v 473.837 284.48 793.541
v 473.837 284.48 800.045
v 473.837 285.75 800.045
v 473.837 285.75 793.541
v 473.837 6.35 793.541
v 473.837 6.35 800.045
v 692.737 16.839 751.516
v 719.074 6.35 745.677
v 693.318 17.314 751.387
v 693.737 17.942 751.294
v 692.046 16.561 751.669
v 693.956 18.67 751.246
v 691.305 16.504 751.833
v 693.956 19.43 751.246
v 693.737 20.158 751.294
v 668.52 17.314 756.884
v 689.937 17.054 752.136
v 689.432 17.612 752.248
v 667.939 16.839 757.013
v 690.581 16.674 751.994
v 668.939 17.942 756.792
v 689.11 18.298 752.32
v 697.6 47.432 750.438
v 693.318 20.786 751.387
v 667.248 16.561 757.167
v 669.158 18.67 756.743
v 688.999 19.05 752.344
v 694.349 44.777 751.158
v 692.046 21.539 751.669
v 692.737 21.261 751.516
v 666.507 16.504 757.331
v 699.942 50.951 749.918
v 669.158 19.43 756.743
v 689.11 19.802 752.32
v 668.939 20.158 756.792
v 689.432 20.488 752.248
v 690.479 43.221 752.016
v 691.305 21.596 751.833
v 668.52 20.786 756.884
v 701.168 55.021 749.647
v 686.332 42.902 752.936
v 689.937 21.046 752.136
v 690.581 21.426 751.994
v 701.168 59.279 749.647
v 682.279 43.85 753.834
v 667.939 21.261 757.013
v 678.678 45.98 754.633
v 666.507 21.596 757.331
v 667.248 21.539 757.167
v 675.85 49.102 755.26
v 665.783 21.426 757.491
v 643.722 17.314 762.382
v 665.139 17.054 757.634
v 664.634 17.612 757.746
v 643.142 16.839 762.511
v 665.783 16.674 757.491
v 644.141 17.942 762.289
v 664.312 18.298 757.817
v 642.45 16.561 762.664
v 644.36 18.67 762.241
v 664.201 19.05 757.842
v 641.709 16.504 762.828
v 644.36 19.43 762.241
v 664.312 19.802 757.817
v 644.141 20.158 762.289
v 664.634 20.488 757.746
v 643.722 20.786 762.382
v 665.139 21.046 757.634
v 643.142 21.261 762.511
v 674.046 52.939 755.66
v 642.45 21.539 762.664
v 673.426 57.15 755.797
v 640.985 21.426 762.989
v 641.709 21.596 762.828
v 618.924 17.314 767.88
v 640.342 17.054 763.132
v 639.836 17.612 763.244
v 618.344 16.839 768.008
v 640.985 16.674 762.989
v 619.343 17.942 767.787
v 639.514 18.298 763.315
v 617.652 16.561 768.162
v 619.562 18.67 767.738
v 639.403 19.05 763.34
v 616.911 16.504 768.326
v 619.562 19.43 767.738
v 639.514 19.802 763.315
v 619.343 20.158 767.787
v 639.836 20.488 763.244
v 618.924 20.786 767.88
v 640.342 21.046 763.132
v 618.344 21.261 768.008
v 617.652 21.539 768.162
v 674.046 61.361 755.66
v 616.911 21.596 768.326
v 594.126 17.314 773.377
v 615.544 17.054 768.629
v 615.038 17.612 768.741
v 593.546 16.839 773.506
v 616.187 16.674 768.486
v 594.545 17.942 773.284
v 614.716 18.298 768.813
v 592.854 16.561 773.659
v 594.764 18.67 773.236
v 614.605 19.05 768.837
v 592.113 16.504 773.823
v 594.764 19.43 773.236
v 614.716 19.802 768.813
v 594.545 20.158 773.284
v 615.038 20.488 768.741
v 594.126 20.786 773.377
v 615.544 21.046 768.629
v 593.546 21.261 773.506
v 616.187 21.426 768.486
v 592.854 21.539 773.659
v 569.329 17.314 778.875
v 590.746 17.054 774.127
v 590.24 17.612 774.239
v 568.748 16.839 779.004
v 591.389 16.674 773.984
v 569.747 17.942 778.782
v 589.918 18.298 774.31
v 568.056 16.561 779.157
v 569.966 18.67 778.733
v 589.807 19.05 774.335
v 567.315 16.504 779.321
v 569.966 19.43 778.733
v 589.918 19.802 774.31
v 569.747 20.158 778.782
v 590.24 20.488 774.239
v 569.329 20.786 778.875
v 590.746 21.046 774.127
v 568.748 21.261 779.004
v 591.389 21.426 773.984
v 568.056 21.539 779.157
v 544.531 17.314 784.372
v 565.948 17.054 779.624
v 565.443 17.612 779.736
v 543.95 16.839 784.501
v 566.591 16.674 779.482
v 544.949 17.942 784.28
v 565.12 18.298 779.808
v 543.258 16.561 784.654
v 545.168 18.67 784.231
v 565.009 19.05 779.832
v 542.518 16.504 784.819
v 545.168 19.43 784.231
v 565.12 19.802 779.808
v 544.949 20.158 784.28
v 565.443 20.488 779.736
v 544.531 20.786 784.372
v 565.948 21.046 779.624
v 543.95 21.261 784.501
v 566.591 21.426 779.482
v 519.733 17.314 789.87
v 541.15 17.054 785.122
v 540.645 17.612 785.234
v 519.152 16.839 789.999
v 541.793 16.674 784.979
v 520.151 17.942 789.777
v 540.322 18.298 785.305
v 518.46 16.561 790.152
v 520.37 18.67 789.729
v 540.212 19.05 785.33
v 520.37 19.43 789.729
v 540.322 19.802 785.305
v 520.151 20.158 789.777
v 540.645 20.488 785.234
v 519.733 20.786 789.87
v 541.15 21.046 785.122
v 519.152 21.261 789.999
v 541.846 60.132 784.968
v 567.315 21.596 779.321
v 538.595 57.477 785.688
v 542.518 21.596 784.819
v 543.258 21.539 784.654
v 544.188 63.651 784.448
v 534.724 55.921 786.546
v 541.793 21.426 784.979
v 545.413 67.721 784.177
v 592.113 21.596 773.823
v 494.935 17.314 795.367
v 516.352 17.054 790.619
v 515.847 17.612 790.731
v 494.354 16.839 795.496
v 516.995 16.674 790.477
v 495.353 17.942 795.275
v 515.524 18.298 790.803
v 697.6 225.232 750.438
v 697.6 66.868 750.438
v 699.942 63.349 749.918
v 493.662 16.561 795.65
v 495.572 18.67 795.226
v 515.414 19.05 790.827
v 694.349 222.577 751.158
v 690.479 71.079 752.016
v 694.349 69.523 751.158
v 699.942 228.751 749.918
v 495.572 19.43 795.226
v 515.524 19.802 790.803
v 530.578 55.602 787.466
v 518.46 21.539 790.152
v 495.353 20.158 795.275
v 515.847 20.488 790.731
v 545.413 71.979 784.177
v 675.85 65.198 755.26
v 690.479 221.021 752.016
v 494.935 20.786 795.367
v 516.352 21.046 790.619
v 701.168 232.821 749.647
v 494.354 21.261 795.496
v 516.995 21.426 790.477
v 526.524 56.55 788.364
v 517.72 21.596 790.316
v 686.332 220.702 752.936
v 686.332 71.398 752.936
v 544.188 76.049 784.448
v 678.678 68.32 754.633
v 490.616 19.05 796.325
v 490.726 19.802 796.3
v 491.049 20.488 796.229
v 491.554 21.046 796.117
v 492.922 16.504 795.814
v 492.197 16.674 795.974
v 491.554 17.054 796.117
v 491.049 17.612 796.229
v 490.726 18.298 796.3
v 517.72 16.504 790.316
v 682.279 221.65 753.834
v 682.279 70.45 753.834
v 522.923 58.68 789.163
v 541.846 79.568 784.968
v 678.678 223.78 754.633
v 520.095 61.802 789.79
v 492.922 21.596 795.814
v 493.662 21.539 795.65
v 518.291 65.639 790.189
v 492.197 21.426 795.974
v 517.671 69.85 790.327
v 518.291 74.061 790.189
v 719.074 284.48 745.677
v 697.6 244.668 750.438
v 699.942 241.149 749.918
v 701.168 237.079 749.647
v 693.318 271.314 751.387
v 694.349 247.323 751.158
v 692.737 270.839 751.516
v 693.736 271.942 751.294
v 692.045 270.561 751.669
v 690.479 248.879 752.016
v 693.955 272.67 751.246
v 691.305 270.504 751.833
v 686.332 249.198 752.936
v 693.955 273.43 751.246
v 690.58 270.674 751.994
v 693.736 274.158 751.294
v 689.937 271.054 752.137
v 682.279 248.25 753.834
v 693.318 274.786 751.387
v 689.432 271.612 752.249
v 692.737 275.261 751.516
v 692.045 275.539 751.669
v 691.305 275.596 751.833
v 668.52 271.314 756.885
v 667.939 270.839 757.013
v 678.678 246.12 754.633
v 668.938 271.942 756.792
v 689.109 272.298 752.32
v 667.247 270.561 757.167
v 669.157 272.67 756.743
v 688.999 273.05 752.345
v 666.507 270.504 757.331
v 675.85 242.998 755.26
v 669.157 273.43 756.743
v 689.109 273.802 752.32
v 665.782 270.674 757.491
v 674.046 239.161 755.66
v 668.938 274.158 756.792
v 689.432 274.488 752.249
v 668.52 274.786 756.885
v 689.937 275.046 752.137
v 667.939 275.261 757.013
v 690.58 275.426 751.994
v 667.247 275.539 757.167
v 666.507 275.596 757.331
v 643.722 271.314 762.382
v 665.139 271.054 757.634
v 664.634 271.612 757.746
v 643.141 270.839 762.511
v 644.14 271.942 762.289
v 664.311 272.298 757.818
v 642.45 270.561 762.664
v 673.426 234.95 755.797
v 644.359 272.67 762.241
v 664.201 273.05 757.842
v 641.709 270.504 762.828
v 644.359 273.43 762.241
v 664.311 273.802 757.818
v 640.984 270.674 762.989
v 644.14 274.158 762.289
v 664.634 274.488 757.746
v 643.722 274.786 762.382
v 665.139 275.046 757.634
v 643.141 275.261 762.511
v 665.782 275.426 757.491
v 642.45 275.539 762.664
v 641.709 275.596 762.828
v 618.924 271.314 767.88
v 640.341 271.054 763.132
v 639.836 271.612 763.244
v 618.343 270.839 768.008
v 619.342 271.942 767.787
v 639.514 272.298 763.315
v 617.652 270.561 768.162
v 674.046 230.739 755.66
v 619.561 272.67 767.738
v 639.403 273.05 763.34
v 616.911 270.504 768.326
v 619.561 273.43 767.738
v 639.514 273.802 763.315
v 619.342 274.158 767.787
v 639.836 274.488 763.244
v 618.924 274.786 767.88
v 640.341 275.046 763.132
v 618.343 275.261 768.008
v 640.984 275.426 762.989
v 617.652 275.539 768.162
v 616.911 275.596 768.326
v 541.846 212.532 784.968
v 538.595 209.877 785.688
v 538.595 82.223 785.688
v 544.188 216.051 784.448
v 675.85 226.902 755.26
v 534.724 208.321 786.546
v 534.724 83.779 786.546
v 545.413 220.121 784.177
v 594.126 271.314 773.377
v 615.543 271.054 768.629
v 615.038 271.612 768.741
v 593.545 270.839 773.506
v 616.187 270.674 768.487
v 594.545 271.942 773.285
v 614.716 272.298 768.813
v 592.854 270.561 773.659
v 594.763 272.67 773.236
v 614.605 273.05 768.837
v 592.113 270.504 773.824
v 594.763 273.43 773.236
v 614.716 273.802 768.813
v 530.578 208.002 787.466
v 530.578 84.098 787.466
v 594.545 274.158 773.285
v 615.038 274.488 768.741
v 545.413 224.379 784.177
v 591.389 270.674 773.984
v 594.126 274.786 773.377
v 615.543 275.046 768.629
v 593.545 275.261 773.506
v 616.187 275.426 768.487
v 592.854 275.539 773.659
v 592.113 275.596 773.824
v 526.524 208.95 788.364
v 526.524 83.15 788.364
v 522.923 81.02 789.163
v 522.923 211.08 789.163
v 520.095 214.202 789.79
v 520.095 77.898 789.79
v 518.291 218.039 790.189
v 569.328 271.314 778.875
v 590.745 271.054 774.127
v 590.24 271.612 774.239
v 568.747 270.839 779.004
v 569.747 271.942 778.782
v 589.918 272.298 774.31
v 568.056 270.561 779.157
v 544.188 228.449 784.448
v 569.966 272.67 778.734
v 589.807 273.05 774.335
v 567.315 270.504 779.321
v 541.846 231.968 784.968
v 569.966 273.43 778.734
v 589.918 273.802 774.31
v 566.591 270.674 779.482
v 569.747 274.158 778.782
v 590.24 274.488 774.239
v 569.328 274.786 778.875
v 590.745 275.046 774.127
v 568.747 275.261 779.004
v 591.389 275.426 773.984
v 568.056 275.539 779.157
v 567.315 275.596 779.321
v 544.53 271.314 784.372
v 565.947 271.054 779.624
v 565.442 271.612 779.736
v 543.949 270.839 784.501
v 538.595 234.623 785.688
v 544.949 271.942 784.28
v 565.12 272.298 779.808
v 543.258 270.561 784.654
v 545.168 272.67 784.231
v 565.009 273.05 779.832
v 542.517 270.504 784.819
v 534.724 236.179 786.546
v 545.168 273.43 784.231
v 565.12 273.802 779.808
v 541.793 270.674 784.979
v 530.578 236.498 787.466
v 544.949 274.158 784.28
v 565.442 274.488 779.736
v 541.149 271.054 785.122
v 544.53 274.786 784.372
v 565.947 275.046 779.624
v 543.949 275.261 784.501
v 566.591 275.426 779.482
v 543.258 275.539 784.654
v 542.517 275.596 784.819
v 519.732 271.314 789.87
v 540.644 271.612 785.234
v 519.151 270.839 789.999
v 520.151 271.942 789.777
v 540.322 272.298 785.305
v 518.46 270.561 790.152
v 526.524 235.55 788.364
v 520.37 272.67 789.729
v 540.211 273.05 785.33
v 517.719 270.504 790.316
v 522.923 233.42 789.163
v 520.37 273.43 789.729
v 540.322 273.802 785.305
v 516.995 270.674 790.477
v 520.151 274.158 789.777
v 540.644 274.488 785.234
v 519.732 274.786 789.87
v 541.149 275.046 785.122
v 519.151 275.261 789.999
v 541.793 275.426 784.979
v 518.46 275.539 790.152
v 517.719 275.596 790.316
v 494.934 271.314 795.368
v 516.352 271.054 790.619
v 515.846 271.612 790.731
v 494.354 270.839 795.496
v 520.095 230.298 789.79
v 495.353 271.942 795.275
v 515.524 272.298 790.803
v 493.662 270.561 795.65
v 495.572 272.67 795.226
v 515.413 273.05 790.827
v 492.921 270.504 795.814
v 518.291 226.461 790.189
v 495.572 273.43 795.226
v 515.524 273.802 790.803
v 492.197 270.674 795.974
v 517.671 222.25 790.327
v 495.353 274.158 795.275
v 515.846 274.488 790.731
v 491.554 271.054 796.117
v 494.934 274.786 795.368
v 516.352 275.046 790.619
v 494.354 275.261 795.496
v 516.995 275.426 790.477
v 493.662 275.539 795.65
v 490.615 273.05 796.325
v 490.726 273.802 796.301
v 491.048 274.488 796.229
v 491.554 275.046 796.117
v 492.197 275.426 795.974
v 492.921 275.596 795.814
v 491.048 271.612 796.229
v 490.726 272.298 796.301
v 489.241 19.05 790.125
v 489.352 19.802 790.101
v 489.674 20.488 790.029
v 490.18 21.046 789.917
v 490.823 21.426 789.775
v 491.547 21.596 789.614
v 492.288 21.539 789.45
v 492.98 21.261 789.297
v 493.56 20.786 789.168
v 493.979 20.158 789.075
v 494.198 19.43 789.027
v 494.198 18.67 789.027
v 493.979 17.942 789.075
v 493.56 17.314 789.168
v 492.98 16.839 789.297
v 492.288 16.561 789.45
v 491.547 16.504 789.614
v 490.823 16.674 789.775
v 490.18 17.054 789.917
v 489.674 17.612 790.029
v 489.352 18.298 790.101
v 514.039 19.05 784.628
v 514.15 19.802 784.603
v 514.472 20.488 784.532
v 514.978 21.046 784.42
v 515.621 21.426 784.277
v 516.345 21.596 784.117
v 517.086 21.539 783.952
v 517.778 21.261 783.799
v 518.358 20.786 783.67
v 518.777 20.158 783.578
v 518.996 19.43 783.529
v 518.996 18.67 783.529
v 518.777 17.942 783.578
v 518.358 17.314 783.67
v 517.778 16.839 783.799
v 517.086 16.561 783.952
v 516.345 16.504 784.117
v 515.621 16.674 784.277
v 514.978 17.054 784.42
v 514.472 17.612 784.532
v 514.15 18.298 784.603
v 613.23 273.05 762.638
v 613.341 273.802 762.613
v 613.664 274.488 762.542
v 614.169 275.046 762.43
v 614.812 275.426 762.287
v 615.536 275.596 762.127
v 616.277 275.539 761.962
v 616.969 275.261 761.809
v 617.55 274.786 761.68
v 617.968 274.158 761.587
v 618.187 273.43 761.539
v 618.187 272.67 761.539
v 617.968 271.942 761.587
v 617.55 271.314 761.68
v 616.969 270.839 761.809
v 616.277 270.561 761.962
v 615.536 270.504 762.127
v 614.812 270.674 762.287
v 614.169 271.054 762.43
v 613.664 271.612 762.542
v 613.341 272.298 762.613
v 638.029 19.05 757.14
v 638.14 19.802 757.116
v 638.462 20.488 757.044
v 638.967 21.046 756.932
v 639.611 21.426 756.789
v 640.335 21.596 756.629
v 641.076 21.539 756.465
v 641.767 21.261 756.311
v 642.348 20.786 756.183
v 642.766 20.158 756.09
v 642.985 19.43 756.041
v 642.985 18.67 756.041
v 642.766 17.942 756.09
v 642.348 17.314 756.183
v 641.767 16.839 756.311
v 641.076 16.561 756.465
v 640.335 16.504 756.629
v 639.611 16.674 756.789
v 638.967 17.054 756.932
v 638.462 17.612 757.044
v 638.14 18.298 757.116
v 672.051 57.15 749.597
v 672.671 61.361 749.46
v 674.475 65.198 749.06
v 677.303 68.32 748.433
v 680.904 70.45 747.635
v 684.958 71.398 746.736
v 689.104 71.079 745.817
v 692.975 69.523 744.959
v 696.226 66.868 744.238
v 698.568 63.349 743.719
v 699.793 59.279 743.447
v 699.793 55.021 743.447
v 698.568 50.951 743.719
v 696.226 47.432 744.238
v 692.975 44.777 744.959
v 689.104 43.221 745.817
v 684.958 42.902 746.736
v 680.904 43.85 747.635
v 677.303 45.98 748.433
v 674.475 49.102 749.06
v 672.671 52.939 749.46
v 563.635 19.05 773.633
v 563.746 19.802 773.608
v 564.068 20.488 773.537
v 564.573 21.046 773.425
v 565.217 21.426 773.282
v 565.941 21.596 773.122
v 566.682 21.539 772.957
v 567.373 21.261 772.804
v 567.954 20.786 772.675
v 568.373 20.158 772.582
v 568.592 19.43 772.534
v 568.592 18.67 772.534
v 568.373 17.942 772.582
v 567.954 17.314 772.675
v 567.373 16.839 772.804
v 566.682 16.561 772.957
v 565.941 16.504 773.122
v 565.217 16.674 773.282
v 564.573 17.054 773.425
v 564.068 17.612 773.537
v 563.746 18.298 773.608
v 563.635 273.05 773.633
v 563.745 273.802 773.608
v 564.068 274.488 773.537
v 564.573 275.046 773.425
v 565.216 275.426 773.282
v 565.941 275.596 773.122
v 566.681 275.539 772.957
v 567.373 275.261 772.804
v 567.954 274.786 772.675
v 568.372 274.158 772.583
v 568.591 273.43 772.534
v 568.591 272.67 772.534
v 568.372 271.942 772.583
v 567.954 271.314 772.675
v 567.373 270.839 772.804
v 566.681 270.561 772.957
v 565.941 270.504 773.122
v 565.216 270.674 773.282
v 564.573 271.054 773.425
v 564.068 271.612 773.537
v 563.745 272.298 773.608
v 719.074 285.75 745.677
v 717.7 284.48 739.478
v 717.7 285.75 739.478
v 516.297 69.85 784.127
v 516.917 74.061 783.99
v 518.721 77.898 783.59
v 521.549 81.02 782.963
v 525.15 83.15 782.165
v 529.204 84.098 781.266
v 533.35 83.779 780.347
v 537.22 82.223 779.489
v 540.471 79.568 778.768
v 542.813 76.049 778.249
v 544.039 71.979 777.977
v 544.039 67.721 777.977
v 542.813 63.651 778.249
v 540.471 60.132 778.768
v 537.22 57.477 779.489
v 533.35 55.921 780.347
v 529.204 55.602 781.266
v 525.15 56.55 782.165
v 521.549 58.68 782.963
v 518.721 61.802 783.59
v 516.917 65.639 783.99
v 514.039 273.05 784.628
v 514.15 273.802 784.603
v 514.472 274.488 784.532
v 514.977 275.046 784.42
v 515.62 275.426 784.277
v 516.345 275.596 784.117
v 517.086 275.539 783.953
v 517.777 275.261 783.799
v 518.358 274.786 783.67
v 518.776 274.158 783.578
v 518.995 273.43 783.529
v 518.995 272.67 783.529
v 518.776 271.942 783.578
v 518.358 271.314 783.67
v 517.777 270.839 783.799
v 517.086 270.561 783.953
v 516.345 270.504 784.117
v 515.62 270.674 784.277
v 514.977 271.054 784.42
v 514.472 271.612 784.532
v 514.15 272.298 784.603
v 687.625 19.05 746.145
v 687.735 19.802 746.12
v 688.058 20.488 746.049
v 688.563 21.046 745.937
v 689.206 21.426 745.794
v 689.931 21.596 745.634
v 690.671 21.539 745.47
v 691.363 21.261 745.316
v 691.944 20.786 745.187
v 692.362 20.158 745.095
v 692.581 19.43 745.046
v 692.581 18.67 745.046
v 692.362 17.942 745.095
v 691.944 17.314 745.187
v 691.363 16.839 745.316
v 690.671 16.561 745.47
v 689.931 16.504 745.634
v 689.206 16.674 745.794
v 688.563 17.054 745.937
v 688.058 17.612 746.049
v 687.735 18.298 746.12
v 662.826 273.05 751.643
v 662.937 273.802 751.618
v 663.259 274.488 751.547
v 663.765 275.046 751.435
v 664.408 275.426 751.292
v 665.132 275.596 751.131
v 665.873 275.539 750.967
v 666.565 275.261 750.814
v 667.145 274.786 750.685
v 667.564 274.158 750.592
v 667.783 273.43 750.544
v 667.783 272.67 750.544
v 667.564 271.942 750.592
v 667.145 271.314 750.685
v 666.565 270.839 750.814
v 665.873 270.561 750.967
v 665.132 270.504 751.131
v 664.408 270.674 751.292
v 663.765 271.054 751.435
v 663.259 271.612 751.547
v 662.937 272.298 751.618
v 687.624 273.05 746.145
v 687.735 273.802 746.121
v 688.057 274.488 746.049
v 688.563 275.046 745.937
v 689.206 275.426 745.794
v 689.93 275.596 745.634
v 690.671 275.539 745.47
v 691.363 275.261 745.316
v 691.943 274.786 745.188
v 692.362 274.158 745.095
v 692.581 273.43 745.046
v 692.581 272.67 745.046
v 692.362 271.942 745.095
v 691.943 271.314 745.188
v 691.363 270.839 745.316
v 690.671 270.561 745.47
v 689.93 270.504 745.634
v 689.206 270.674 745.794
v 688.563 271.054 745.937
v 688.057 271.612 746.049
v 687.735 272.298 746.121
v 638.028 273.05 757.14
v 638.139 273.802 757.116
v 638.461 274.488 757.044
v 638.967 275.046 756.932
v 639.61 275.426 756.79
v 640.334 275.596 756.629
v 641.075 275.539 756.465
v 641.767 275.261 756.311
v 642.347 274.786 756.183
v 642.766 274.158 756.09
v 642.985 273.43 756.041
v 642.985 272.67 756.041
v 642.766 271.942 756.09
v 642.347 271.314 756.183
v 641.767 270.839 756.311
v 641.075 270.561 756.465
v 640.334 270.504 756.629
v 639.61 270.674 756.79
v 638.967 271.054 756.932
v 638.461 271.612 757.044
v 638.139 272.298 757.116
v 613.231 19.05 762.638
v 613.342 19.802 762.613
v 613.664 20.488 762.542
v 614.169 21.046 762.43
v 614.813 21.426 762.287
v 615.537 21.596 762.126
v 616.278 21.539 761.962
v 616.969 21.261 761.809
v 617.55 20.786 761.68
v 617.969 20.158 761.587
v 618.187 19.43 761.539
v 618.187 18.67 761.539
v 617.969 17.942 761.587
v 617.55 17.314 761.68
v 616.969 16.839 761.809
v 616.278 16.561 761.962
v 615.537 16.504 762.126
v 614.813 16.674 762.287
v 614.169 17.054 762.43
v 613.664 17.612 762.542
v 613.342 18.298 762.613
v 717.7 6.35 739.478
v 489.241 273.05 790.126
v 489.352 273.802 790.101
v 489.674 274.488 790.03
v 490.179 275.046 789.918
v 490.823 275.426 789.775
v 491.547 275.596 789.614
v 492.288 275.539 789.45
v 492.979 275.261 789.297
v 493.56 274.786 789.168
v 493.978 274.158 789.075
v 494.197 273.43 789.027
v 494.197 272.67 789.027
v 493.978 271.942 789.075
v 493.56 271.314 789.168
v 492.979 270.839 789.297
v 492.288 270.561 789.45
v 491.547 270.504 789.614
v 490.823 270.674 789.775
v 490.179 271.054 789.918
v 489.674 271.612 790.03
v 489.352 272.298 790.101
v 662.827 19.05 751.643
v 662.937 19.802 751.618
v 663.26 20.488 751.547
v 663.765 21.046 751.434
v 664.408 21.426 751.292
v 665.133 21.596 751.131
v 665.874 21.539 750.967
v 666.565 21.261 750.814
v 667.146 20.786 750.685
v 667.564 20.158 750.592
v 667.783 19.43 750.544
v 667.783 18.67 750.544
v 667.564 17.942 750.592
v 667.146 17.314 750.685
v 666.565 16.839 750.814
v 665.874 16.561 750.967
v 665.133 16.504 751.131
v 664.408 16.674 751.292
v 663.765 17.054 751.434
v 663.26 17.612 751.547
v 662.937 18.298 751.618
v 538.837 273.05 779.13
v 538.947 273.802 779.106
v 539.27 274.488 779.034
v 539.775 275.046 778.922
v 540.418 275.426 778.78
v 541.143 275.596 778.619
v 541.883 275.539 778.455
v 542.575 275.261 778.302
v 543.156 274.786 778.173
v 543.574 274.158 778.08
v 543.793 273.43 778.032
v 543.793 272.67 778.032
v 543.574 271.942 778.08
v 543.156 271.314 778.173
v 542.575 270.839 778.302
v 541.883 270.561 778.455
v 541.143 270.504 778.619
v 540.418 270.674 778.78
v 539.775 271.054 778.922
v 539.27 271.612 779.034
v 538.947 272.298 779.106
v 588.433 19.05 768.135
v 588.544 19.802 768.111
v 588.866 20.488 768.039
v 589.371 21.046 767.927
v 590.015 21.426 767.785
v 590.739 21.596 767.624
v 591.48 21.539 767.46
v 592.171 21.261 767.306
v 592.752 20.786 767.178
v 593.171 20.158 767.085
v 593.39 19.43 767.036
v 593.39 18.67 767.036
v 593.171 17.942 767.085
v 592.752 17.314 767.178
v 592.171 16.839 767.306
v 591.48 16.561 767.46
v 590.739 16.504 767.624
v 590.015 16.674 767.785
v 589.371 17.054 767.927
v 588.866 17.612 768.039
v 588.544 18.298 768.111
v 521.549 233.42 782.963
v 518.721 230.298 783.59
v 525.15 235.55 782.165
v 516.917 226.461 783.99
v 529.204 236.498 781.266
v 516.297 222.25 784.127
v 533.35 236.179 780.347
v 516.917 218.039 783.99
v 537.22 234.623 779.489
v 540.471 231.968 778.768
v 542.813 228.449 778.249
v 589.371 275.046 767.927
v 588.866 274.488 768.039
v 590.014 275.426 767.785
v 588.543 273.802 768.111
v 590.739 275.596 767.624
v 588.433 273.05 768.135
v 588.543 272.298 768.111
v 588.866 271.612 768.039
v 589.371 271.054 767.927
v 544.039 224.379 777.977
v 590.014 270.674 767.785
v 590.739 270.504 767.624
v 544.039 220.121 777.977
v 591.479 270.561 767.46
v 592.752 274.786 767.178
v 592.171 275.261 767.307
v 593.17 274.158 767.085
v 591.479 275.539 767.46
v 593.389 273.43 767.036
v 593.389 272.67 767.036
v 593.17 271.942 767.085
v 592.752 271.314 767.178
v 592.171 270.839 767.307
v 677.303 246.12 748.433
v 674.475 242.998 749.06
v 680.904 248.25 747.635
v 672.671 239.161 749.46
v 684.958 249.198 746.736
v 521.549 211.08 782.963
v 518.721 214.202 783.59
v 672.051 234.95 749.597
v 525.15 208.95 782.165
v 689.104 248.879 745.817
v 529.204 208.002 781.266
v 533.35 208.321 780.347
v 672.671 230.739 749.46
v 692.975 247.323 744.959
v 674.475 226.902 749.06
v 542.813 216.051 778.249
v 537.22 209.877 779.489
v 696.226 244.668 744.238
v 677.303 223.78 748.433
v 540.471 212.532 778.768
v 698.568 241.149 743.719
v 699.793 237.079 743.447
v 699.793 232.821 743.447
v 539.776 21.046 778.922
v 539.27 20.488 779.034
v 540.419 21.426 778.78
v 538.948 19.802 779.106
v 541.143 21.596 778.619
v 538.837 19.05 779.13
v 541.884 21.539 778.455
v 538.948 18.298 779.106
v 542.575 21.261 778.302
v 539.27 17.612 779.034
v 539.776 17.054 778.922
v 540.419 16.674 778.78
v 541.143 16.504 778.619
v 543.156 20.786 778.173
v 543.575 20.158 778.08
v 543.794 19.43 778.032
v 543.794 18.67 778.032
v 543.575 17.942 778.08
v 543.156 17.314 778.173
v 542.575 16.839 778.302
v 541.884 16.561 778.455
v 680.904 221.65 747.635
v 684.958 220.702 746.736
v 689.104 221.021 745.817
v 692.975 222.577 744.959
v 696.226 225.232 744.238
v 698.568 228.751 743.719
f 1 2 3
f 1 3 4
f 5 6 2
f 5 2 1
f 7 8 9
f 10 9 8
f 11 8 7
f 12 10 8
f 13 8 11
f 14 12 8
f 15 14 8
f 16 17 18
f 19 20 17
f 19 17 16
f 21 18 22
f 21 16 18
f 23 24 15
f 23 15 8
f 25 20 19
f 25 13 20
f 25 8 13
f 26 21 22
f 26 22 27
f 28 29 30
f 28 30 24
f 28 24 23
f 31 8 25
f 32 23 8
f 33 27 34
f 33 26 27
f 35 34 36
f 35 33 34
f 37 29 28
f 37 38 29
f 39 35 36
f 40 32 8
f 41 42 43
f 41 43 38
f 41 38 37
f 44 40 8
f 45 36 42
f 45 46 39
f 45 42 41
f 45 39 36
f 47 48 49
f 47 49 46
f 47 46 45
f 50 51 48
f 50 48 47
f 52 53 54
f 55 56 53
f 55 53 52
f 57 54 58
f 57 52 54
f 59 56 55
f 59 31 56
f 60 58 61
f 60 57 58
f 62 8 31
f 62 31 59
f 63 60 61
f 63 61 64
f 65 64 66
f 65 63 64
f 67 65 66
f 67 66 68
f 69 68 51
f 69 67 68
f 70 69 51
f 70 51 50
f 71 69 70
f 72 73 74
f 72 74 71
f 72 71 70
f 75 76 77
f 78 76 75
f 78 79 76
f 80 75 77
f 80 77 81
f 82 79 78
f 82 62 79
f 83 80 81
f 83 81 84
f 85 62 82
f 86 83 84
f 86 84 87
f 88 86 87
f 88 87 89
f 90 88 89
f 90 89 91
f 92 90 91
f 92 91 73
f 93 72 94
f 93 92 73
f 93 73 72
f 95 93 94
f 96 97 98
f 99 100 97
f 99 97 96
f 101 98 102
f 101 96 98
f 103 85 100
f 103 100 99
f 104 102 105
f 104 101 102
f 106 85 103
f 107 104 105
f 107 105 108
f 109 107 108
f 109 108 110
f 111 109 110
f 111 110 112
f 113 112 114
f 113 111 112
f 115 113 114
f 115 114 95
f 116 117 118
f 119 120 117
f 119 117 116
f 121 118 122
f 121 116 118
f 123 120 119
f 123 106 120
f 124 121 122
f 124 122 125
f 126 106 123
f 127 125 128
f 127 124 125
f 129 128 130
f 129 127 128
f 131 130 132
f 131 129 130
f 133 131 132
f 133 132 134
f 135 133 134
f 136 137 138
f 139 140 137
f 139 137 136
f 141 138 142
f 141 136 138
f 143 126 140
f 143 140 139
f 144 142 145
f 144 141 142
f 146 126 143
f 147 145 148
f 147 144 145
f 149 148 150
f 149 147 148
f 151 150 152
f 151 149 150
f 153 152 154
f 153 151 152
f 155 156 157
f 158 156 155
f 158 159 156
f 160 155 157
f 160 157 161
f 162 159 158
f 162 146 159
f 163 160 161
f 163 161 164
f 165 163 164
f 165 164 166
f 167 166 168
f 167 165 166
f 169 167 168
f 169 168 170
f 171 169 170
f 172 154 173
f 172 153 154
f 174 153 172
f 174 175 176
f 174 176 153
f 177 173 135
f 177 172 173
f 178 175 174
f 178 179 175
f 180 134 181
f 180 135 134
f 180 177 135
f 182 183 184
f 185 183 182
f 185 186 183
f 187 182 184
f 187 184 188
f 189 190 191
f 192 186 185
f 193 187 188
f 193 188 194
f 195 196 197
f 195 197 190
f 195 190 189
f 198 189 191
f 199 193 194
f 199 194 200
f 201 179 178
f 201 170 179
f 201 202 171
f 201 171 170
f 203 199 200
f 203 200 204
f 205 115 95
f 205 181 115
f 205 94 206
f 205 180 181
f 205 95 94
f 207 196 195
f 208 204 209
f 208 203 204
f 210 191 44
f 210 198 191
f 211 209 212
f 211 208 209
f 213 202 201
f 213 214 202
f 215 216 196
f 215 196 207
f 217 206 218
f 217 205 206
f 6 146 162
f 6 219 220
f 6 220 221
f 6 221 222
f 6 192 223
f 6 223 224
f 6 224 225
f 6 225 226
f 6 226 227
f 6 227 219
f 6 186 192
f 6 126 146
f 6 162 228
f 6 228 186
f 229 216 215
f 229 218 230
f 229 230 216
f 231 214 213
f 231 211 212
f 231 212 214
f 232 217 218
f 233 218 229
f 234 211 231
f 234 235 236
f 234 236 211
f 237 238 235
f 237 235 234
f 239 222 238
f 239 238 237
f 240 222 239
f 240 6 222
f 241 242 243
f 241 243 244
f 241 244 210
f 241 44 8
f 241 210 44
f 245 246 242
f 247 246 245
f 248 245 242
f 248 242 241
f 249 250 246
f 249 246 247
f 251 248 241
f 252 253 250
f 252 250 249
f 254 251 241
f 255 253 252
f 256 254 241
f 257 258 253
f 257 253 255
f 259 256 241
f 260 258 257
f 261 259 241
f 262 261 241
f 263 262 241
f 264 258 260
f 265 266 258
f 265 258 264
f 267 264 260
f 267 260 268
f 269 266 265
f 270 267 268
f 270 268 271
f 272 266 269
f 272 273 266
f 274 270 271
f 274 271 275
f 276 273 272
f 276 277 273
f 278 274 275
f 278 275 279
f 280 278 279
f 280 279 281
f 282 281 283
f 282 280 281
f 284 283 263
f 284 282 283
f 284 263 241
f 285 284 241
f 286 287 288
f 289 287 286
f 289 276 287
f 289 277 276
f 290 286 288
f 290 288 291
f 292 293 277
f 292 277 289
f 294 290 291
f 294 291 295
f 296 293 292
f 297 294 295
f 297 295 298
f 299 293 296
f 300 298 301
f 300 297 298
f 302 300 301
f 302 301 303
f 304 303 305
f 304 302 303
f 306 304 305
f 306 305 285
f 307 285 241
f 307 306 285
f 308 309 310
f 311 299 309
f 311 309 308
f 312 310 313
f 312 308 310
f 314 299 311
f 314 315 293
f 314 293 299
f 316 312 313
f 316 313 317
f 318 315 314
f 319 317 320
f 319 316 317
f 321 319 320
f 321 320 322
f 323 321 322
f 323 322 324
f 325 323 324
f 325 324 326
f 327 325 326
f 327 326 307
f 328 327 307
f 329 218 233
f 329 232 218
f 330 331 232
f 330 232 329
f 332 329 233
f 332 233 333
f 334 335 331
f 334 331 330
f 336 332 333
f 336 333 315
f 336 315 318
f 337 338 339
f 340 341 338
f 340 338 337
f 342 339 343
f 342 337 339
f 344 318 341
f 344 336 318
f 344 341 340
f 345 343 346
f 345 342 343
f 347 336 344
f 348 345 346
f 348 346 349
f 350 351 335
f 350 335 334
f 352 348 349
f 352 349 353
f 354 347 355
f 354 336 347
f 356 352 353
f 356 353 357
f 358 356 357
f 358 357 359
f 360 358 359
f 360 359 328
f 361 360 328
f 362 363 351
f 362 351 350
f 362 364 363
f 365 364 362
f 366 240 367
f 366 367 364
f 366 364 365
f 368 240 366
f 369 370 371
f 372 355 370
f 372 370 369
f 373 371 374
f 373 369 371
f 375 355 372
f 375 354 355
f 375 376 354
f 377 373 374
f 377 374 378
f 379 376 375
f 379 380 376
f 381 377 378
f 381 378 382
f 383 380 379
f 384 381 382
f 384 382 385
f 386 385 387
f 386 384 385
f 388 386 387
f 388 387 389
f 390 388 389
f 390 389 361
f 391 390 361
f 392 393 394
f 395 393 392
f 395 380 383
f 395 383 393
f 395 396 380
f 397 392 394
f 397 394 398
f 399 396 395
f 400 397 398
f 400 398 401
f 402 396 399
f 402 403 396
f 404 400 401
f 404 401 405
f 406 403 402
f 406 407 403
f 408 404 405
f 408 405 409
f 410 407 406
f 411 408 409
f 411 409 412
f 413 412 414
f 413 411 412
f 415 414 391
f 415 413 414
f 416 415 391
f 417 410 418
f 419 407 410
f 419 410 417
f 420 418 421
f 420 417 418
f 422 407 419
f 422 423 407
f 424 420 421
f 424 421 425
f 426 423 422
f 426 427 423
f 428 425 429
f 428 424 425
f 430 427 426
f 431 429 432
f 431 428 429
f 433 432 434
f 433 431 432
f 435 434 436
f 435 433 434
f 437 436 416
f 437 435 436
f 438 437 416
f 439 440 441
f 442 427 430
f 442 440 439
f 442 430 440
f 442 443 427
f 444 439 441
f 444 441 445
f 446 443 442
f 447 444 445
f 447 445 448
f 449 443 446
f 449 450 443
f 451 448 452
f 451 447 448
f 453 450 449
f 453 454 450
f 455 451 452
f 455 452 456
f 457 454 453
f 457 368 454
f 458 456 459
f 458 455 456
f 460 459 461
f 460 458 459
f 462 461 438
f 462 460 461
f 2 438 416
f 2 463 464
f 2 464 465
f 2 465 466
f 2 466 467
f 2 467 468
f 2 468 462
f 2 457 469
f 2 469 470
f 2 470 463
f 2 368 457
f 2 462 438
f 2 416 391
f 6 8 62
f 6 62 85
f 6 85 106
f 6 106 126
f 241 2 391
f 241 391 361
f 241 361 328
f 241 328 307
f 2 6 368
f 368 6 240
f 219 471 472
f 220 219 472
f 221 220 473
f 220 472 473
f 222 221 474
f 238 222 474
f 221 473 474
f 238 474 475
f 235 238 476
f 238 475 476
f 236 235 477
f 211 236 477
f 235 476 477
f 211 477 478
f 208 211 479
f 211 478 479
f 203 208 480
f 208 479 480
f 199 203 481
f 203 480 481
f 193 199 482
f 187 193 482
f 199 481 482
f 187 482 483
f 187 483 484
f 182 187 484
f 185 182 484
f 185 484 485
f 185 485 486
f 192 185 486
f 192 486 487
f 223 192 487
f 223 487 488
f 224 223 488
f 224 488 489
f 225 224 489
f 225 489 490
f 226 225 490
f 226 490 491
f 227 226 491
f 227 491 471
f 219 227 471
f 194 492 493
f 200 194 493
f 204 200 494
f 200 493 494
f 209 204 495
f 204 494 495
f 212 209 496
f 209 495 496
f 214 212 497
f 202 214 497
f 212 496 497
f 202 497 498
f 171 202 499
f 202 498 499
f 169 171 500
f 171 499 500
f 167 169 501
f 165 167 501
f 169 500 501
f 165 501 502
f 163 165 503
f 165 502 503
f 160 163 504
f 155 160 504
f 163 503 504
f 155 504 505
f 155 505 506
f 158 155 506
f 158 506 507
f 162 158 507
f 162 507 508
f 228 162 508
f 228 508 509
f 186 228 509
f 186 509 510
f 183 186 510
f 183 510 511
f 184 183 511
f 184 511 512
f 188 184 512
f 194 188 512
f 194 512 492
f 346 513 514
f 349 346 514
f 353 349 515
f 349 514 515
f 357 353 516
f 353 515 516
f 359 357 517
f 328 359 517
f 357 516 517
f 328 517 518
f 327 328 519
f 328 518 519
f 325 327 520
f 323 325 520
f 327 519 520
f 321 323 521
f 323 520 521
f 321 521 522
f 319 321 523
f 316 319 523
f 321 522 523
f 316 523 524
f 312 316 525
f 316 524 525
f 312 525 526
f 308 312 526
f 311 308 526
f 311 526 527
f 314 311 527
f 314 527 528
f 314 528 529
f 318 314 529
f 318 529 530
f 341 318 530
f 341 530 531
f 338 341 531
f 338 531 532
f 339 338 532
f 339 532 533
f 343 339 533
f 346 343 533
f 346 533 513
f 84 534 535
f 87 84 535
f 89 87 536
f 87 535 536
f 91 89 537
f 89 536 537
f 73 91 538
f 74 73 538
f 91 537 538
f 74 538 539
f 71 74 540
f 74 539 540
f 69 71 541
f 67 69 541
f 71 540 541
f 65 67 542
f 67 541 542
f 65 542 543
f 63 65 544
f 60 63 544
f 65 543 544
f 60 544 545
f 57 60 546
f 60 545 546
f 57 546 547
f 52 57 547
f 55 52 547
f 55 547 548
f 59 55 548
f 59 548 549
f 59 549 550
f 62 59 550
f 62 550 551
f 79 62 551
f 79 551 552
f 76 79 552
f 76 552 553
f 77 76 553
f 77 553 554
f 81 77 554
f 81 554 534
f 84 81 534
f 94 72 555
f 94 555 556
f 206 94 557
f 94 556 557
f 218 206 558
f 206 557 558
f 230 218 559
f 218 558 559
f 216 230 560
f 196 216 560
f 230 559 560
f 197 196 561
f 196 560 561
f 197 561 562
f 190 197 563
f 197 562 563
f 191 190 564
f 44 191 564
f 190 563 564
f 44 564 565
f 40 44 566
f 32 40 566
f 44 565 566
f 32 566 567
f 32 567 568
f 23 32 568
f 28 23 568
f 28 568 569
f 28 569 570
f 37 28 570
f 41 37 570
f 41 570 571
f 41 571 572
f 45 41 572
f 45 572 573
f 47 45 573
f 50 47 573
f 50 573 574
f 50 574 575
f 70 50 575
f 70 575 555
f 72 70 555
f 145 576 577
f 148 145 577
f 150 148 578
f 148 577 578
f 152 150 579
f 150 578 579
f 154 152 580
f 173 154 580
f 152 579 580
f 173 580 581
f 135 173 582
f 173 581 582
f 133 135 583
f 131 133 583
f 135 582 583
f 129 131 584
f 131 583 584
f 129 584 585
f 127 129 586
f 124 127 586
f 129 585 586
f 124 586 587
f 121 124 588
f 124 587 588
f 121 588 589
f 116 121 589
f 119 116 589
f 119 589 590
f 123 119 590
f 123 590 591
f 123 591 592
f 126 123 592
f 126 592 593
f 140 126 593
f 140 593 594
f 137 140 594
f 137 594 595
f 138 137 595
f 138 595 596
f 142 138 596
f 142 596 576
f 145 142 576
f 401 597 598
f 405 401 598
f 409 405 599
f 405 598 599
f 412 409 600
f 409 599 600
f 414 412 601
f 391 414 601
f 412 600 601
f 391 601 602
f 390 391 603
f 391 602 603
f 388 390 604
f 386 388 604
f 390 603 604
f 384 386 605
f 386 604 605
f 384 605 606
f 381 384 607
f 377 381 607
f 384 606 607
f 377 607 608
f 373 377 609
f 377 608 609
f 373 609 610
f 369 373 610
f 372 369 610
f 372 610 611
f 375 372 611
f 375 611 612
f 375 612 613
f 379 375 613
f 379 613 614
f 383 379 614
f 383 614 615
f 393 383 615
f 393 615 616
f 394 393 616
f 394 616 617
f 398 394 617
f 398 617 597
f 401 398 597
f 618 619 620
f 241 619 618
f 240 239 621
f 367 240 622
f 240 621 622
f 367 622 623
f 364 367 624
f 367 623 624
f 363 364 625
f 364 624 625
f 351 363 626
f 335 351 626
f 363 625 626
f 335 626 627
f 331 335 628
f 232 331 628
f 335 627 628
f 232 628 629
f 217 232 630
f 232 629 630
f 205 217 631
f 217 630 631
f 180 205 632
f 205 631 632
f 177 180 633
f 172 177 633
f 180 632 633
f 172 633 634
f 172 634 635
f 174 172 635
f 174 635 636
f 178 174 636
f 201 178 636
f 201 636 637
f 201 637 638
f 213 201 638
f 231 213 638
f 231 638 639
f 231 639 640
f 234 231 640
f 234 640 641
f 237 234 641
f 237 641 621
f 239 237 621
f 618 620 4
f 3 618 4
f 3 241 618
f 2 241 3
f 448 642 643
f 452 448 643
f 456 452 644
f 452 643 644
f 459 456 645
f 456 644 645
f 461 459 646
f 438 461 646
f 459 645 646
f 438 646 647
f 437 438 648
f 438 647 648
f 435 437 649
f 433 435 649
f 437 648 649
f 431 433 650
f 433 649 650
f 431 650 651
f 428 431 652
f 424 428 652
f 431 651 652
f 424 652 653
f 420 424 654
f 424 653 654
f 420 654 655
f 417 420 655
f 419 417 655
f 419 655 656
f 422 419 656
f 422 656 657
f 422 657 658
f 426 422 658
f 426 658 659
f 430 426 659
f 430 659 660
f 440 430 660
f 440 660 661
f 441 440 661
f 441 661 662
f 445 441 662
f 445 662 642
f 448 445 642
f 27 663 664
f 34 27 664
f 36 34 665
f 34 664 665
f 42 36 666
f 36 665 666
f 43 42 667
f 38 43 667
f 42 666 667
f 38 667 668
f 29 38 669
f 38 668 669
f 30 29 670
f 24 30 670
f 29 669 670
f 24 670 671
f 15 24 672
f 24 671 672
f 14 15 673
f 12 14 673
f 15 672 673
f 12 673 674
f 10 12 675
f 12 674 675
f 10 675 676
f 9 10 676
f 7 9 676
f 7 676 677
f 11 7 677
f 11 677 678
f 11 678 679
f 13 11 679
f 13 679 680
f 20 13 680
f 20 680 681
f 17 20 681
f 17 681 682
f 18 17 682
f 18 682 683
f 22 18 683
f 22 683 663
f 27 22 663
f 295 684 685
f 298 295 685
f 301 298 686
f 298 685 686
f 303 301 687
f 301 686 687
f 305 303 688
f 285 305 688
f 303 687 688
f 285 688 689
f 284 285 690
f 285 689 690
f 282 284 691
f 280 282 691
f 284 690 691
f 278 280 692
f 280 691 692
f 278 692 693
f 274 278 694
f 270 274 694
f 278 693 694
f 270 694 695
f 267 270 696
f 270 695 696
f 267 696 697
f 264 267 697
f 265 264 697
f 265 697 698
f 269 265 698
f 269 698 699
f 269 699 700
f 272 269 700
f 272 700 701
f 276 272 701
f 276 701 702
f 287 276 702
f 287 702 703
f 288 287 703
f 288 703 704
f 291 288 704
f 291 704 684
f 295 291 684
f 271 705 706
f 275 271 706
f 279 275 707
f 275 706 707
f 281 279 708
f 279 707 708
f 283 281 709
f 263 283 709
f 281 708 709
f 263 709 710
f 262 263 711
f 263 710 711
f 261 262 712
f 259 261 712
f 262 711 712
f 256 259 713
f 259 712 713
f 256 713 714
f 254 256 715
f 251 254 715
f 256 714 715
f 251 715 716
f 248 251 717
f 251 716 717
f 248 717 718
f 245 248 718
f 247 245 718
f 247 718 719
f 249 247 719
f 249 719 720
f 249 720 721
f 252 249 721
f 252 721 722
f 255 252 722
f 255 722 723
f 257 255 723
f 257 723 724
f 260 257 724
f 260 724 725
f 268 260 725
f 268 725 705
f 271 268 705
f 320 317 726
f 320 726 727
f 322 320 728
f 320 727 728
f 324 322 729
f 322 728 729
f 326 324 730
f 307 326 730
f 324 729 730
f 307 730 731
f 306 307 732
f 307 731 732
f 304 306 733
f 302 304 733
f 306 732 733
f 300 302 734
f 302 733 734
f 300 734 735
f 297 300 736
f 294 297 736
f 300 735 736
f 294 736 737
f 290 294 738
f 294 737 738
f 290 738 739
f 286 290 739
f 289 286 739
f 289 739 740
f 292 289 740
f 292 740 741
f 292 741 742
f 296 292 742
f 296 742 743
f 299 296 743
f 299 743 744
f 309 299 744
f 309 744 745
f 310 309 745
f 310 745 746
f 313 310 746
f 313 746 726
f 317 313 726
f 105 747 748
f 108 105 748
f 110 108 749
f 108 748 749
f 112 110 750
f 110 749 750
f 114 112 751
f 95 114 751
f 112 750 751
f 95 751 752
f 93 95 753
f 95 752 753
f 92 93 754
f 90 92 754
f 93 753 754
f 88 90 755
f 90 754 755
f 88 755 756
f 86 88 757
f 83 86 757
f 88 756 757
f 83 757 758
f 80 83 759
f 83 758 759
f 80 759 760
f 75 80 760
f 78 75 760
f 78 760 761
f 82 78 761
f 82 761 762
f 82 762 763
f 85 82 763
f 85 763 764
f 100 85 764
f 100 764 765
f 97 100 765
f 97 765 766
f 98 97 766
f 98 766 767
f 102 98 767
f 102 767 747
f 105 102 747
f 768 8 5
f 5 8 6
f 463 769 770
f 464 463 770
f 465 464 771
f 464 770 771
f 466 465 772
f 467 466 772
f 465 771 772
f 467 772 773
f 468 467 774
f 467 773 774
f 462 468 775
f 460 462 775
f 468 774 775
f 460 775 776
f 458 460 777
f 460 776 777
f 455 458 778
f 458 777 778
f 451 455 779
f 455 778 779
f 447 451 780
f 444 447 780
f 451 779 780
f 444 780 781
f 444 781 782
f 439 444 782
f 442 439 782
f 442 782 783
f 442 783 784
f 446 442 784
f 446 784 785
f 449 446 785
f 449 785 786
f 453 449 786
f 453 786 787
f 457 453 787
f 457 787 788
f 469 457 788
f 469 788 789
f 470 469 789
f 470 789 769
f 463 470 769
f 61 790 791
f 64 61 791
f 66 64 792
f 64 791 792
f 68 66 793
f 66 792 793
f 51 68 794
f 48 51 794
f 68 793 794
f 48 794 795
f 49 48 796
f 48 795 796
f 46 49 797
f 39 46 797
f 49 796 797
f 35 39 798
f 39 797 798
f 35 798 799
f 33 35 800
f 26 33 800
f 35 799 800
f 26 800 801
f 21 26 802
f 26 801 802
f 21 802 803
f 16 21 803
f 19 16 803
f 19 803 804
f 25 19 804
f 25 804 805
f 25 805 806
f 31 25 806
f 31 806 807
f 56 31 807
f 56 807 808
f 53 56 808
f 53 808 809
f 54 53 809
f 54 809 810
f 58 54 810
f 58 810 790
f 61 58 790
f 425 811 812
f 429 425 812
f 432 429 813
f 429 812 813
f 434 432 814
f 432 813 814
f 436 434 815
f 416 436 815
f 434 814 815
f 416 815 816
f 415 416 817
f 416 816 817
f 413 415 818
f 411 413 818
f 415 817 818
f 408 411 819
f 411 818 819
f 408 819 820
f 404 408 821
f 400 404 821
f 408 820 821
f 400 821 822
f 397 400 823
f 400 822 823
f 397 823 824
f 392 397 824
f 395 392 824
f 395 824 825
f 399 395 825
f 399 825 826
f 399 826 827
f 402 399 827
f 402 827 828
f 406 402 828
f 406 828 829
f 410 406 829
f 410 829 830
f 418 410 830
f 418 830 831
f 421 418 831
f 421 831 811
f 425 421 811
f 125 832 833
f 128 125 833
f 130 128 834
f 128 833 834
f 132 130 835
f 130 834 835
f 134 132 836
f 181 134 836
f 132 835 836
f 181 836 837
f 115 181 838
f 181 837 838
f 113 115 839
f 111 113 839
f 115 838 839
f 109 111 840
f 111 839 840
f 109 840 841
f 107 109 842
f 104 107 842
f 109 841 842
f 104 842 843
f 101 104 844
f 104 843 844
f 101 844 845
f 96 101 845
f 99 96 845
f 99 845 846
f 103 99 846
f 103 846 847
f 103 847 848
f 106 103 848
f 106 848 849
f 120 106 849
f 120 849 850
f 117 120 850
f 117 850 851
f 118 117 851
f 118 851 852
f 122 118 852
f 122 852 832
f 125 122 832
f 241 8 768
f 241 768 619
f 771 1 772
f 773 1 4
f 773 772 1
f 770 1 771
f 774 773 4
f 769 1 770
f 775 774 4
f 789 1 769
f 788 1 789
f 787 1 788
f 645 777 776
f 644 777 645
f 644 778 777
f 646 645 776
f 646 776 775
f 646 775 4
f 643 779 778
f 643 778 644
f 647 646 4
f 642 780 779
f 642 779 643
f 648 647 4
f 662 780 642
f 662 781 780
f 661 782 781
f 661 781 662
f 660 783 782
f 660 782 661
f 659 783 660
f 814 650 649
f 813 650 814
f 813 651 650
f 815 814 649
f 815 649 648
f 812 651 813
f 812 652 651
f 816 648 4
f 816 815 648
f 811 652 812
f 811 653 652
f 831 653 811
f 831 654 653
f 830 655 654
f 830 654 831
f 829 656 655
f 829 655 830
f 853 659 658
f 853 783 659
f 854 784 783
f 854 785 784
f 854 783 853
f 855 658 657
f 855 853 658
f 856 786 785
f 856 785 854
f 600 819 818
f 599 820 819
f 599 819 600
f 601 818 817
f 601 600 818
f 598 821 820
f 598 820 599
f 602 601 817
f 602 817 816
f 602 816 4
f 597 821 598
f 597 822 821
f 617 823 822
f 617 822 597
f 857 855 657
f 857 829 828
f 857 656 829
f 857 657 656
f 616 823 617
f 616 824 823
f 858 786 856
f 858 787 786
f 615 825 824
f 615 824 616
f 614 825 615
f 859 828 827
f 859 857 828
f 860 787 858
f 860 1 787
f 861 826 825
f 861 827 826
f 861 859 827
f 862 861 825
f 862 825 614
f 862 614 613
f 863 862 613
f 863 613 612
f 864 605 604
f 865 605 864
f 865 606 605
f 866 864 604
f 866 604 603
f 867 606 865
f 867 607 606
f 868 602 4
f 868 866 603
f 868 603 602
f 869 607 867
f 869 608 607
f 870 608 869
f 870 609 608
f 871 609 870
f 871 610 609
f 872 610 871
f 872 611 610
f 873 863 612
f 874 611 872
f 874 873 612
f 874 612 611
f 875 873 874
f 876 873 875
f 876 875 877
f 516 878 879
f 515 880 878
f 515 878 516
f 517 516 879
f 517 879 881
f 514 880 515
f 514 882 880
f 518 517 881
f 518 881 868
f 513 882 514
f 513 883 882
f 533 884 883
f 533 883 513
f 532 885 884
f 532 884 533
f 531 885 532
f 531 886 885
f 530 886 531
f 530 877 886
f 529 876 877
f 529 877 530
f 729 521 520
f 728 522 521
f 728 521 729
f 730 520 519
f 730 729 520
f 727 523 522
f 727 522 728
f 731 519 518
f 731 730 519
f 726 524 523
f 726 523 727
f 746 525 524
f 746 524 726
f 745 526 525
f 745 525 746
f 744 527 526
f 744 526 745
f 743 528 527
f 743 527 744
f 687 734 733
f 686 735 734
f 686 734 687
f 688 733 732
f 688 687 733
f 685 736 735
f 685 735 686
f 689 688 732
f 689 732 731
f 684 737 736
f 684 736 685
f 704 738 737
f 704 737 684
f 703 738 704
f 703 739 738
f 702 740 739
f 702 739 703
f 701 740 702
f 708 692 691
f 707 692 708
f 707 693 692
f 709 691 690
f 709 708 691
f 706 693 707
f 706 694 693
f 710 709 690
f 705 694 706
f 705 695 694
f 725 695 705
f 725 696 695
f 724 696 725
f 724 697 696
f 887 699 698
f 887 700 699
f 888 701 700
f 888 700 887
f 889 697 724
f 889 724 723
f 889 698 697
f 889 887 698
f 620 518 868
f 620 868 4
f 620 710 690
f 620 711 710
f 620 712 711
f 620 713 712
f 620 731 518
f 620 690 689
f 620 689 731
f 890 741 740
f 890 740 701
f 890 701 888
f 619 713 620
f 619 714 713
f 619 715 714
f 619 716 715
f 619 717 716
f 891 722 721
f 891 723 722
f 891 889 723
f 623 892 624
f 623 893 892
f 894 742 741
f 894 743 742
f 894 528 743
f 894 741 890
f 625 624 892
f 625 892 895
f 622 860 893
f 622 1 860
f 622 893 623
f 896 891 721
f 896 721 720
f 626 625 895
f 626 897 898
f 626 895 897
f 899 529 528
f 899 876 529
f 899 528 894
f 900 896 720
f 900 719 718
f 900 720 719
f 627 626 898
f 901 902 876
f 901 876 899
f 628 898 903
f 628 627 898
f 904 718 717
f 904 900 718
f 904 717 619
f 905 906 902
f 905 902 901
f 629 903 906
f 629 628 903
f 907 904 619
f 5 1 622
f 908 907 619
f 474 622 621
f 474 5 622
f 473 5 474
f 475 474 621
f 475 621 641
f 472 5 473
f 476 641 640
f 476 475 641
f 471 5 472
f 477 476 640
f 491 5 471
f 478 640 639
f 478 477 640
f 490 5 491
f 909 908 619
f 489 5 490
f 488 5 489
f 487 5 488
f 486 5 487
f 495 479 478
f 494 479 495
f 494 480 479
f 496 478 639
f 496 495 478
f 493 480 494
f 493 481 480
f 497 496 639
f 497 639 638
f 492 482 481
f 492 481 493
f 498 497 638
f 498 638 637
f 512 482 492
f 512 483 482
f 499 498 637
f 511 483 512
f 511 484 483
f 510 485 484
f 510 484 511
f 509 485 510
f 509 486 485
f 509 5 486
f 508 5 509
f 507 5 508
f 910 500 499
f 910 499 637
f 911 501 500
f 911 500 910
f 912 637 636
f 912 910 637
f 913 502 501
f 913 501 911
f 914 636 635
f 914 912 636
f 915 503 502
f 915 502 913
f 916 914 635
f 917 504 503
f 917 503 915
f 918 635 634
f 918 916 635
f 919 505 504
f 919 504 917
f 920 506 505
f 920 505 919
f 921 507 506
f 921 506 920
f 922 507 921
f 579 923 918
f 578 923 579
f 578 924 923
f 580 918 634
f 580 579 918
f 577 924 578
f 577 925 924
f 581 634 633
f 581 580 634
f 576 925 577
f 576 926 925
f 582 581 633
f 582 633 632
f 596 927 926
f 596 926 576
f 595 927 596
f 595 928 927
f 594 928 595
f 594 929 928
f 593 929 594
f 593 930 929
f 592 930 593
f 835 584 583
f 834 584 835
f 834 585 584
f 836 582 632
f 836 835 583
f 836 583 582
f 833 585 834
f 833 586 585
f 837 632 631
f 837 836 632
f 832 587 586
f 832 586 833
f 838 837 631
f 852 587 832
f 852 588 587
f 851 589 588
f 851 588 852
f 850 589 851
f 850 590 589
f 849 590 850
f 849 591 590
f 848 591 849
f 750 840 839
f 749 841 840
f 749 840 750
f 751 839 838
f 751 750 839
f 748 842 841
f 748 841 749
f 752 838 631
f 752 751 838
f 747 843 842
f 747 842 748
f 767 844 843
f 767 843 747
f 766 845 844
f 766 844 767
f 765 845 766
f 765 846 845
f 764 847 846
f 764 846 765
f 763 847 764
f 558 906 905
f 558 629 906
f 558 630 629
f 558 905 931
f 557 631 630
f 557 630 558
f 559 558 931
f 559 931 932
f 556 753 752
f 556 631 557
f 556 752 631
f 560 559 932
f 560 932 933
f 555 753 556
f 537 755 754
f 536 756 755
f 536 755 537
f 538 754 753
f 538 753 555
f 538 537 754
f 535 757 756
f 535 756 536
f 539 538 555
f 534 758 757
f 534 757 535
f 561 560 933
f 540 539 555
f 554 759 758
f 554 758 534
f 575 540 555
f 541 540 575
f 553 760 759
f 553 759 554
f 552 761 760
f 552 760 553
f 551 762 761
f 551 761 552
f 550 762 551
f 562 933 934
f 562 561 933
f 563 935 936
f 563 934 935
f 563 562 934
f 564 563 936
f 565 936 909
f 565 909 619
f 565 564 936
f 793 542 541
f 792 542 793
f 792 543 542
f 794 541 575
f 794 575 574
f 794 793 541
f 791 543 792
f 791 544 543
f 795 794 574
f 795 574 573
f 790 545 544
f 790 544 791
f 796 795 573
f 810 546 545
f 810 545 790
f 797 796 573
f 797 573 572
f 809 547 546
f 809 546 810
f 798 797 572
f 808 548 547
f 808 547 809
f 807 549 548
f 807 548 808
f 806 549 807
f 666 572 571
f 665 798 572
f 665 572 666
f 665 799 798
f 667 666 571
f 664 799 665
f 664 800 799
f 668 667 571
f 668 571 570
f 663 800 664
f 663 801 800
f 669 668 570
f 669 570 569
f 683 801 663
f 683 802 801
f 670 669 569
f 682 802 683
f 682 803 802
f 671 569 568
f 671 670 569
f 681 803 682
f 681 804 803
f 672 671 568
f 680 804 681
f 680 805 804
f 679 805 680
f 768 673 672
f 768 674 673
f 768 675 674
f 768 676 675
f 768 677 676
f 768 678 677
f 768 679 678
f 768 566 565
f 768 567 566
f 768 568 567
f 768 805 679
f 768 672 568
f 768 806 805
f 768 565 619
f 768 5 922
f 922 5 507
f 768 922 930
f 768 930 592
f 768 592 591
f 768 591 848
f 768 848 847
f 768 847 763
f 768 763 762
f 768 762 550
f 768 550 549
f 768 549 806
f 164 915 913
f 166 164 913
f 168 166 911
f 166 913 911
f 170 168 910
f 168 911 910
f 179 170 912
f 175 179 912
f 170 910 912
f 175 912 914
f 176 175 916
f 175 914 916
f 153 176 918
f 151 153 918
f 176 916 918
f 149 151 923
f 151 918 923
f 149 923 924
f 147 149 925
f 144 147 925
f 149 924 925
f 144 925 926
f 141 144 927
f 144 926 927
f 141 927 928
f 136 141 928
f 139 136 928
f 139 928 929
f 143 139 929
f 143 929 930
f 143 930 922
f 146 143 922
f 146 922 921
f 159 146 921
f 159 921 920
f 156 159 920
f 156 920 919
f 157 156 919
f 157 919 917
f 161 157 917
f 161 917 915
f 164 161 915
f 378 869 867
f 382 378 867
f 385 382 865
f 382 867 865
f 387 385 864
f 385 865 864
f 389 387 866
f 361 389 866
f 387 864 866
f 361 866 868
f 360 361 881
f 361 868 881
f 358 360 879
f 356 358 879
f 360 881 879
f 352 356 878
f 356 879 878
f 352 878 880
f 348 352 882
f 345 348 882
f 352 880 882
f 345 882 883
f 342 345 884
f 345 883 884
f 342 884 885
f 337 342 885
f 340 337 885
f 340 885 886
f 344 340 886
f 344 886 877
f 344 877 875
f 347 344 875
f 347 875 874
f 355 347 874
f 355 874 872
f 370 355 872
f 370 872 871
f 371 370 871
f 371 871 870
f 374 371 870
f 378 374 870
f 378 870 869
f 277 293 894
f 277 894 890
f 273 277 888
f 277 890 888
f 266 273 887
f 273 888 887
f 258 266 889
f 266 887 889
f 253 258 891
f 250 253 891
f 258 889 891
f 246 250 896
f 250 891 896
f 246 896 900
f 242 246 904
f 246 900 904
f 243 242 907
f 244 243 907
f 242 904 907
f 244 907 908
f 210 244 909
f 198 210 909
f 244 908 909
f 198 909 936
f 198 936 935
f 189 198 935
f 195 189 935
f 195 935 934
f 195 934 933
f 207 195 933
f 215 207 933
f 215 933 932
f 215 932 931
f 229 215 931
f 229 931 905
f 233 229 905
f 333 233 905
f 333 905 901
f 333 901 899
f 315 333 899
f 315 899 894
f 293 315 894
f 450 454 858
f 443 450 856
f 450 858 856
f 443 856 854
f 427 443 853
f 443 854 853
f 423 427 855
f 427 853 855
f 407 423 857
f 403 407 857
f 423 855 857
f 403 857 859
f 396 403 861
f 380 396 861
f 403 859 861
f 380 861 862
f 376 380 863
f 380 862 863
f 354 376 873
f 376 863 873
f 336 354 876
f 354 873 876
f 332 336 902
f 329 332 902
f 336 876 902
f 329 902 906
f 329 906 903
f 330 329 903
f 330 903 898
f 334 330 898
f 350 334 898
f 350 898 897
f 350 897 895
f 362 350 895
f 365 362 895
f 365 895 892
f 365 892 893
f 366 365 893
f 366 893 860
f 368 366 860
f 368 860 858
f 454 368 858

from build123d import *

# Parameters (mm, degrees)
SKETCH1_W                      = 278.13
SKETCH1_H                      = 251.191235252
BOSS_EXTRUDE1_DEPTH            = 6.35
DRAFT1_ANGLE                   = -12.5
HOLE1_D                        = 28.575
HOLE1_DEPTH                    = 59.131528827
F_7_0_201_DIAMETER_HOLE1_D     = 5.1054
F_7_0_201_DIAMETER_HOLE1_DEPTH = 59.131528827
BOSS_EXTRUDE2_DEPTH            = 1.27


with BuildPart() as part:
    # Sketch1 → Boss-Extrude1 (new body)
    with BuildSketch(Plane(origin=(191.25417179, 0, 862.691819056), x_dir=(0, 1, 0), z_dir=(0.21643961393810301, 0, 0.9762960071199335))):
        with Locations((145.415, -415.039419658)):
            Rectangle(SKETCH1_W, SKETCH1_H)
    extrude(amount=-BOSS_EXTRUDE1_DEPTH)

    # Draft1
    draft1_faces = [part.faces().sort_by_distance(p)[0] for p in [
        (473.149804226, 145.415, 796.944974464),
    ]]
    draft(draft1_faces, Plane(origin=(191.25417179, 0, 862.691819056), x_dir=(0.9762960071199334, 0, -0.21643961393810301), z_dir=(0.216439613938103, 0, 0.9762960071199333)), DRAFT1_ANGLE)

    # Hole1
    with Locations(Plane(origin=(191.25417179, 0, 862.691819056), x_dir=(0.976296007119934, 0, -0.21643961393809993), z_dir=(0.21643961393809993, 0, 0.9762960071199341))):
        with Locations((348.630068619, 222.25), (508.166081715, 234.95), (508.166081715, 57.15), (348.630068619, 69.85)):
            Hole(HOLE1_D / 2, depth=HOLE1_DEPTH)

    # #7 (0.201) Diameter Hole1
    with Locations(Plane(origin=(191.25417179, 0, 862.691819056), x_dir=(0.9762960071199334, 0, -0.216439613938103), z_dir=(0.21643961393810301, 0, 0.9762960071199335))):
        with Locations((359.982142032, 273.05), (410.782142032, 273.05), (461.582142032, 273.05), (512.382142032, 273.05), (486.982142032, 273.05), (436.182142032, 273.05), (385.382142032, 273.05), (334.582142032, 273.05), (512.382607571, 19.05), (486.982607571, 19.05), (461.582607571, 19.05), (436.182607571, 19.05), (410.782607571, 19.05), (385.382607571, 19.05), (359.982607571, 19.05), (334.582607571, 19.05), (309.182607571, 19.05), (309.182142032, 273.05)):
            Hole(F_7_0_201_DIAMETER_HOLE1_D / 2, depth=F_7_0_201_DIAMETER_HOLE1_DEPTH)

    # Sketch6 → Boss-Extrude2 (add)
    with BuildSketch(Plane(origin=(0, 284.48, 0), x_dir=(1, 0, 0), z_dir=(0, 1, 0))):
        Polygon((473.837, -800.044714287), (473.837, -793.540539371), (717.699608451, -739.477500659), (719.074, -745.676980304), align=None)
    extrude(amount=BOSS_EXTRUDE2_DEPTH)


solid = part.part
